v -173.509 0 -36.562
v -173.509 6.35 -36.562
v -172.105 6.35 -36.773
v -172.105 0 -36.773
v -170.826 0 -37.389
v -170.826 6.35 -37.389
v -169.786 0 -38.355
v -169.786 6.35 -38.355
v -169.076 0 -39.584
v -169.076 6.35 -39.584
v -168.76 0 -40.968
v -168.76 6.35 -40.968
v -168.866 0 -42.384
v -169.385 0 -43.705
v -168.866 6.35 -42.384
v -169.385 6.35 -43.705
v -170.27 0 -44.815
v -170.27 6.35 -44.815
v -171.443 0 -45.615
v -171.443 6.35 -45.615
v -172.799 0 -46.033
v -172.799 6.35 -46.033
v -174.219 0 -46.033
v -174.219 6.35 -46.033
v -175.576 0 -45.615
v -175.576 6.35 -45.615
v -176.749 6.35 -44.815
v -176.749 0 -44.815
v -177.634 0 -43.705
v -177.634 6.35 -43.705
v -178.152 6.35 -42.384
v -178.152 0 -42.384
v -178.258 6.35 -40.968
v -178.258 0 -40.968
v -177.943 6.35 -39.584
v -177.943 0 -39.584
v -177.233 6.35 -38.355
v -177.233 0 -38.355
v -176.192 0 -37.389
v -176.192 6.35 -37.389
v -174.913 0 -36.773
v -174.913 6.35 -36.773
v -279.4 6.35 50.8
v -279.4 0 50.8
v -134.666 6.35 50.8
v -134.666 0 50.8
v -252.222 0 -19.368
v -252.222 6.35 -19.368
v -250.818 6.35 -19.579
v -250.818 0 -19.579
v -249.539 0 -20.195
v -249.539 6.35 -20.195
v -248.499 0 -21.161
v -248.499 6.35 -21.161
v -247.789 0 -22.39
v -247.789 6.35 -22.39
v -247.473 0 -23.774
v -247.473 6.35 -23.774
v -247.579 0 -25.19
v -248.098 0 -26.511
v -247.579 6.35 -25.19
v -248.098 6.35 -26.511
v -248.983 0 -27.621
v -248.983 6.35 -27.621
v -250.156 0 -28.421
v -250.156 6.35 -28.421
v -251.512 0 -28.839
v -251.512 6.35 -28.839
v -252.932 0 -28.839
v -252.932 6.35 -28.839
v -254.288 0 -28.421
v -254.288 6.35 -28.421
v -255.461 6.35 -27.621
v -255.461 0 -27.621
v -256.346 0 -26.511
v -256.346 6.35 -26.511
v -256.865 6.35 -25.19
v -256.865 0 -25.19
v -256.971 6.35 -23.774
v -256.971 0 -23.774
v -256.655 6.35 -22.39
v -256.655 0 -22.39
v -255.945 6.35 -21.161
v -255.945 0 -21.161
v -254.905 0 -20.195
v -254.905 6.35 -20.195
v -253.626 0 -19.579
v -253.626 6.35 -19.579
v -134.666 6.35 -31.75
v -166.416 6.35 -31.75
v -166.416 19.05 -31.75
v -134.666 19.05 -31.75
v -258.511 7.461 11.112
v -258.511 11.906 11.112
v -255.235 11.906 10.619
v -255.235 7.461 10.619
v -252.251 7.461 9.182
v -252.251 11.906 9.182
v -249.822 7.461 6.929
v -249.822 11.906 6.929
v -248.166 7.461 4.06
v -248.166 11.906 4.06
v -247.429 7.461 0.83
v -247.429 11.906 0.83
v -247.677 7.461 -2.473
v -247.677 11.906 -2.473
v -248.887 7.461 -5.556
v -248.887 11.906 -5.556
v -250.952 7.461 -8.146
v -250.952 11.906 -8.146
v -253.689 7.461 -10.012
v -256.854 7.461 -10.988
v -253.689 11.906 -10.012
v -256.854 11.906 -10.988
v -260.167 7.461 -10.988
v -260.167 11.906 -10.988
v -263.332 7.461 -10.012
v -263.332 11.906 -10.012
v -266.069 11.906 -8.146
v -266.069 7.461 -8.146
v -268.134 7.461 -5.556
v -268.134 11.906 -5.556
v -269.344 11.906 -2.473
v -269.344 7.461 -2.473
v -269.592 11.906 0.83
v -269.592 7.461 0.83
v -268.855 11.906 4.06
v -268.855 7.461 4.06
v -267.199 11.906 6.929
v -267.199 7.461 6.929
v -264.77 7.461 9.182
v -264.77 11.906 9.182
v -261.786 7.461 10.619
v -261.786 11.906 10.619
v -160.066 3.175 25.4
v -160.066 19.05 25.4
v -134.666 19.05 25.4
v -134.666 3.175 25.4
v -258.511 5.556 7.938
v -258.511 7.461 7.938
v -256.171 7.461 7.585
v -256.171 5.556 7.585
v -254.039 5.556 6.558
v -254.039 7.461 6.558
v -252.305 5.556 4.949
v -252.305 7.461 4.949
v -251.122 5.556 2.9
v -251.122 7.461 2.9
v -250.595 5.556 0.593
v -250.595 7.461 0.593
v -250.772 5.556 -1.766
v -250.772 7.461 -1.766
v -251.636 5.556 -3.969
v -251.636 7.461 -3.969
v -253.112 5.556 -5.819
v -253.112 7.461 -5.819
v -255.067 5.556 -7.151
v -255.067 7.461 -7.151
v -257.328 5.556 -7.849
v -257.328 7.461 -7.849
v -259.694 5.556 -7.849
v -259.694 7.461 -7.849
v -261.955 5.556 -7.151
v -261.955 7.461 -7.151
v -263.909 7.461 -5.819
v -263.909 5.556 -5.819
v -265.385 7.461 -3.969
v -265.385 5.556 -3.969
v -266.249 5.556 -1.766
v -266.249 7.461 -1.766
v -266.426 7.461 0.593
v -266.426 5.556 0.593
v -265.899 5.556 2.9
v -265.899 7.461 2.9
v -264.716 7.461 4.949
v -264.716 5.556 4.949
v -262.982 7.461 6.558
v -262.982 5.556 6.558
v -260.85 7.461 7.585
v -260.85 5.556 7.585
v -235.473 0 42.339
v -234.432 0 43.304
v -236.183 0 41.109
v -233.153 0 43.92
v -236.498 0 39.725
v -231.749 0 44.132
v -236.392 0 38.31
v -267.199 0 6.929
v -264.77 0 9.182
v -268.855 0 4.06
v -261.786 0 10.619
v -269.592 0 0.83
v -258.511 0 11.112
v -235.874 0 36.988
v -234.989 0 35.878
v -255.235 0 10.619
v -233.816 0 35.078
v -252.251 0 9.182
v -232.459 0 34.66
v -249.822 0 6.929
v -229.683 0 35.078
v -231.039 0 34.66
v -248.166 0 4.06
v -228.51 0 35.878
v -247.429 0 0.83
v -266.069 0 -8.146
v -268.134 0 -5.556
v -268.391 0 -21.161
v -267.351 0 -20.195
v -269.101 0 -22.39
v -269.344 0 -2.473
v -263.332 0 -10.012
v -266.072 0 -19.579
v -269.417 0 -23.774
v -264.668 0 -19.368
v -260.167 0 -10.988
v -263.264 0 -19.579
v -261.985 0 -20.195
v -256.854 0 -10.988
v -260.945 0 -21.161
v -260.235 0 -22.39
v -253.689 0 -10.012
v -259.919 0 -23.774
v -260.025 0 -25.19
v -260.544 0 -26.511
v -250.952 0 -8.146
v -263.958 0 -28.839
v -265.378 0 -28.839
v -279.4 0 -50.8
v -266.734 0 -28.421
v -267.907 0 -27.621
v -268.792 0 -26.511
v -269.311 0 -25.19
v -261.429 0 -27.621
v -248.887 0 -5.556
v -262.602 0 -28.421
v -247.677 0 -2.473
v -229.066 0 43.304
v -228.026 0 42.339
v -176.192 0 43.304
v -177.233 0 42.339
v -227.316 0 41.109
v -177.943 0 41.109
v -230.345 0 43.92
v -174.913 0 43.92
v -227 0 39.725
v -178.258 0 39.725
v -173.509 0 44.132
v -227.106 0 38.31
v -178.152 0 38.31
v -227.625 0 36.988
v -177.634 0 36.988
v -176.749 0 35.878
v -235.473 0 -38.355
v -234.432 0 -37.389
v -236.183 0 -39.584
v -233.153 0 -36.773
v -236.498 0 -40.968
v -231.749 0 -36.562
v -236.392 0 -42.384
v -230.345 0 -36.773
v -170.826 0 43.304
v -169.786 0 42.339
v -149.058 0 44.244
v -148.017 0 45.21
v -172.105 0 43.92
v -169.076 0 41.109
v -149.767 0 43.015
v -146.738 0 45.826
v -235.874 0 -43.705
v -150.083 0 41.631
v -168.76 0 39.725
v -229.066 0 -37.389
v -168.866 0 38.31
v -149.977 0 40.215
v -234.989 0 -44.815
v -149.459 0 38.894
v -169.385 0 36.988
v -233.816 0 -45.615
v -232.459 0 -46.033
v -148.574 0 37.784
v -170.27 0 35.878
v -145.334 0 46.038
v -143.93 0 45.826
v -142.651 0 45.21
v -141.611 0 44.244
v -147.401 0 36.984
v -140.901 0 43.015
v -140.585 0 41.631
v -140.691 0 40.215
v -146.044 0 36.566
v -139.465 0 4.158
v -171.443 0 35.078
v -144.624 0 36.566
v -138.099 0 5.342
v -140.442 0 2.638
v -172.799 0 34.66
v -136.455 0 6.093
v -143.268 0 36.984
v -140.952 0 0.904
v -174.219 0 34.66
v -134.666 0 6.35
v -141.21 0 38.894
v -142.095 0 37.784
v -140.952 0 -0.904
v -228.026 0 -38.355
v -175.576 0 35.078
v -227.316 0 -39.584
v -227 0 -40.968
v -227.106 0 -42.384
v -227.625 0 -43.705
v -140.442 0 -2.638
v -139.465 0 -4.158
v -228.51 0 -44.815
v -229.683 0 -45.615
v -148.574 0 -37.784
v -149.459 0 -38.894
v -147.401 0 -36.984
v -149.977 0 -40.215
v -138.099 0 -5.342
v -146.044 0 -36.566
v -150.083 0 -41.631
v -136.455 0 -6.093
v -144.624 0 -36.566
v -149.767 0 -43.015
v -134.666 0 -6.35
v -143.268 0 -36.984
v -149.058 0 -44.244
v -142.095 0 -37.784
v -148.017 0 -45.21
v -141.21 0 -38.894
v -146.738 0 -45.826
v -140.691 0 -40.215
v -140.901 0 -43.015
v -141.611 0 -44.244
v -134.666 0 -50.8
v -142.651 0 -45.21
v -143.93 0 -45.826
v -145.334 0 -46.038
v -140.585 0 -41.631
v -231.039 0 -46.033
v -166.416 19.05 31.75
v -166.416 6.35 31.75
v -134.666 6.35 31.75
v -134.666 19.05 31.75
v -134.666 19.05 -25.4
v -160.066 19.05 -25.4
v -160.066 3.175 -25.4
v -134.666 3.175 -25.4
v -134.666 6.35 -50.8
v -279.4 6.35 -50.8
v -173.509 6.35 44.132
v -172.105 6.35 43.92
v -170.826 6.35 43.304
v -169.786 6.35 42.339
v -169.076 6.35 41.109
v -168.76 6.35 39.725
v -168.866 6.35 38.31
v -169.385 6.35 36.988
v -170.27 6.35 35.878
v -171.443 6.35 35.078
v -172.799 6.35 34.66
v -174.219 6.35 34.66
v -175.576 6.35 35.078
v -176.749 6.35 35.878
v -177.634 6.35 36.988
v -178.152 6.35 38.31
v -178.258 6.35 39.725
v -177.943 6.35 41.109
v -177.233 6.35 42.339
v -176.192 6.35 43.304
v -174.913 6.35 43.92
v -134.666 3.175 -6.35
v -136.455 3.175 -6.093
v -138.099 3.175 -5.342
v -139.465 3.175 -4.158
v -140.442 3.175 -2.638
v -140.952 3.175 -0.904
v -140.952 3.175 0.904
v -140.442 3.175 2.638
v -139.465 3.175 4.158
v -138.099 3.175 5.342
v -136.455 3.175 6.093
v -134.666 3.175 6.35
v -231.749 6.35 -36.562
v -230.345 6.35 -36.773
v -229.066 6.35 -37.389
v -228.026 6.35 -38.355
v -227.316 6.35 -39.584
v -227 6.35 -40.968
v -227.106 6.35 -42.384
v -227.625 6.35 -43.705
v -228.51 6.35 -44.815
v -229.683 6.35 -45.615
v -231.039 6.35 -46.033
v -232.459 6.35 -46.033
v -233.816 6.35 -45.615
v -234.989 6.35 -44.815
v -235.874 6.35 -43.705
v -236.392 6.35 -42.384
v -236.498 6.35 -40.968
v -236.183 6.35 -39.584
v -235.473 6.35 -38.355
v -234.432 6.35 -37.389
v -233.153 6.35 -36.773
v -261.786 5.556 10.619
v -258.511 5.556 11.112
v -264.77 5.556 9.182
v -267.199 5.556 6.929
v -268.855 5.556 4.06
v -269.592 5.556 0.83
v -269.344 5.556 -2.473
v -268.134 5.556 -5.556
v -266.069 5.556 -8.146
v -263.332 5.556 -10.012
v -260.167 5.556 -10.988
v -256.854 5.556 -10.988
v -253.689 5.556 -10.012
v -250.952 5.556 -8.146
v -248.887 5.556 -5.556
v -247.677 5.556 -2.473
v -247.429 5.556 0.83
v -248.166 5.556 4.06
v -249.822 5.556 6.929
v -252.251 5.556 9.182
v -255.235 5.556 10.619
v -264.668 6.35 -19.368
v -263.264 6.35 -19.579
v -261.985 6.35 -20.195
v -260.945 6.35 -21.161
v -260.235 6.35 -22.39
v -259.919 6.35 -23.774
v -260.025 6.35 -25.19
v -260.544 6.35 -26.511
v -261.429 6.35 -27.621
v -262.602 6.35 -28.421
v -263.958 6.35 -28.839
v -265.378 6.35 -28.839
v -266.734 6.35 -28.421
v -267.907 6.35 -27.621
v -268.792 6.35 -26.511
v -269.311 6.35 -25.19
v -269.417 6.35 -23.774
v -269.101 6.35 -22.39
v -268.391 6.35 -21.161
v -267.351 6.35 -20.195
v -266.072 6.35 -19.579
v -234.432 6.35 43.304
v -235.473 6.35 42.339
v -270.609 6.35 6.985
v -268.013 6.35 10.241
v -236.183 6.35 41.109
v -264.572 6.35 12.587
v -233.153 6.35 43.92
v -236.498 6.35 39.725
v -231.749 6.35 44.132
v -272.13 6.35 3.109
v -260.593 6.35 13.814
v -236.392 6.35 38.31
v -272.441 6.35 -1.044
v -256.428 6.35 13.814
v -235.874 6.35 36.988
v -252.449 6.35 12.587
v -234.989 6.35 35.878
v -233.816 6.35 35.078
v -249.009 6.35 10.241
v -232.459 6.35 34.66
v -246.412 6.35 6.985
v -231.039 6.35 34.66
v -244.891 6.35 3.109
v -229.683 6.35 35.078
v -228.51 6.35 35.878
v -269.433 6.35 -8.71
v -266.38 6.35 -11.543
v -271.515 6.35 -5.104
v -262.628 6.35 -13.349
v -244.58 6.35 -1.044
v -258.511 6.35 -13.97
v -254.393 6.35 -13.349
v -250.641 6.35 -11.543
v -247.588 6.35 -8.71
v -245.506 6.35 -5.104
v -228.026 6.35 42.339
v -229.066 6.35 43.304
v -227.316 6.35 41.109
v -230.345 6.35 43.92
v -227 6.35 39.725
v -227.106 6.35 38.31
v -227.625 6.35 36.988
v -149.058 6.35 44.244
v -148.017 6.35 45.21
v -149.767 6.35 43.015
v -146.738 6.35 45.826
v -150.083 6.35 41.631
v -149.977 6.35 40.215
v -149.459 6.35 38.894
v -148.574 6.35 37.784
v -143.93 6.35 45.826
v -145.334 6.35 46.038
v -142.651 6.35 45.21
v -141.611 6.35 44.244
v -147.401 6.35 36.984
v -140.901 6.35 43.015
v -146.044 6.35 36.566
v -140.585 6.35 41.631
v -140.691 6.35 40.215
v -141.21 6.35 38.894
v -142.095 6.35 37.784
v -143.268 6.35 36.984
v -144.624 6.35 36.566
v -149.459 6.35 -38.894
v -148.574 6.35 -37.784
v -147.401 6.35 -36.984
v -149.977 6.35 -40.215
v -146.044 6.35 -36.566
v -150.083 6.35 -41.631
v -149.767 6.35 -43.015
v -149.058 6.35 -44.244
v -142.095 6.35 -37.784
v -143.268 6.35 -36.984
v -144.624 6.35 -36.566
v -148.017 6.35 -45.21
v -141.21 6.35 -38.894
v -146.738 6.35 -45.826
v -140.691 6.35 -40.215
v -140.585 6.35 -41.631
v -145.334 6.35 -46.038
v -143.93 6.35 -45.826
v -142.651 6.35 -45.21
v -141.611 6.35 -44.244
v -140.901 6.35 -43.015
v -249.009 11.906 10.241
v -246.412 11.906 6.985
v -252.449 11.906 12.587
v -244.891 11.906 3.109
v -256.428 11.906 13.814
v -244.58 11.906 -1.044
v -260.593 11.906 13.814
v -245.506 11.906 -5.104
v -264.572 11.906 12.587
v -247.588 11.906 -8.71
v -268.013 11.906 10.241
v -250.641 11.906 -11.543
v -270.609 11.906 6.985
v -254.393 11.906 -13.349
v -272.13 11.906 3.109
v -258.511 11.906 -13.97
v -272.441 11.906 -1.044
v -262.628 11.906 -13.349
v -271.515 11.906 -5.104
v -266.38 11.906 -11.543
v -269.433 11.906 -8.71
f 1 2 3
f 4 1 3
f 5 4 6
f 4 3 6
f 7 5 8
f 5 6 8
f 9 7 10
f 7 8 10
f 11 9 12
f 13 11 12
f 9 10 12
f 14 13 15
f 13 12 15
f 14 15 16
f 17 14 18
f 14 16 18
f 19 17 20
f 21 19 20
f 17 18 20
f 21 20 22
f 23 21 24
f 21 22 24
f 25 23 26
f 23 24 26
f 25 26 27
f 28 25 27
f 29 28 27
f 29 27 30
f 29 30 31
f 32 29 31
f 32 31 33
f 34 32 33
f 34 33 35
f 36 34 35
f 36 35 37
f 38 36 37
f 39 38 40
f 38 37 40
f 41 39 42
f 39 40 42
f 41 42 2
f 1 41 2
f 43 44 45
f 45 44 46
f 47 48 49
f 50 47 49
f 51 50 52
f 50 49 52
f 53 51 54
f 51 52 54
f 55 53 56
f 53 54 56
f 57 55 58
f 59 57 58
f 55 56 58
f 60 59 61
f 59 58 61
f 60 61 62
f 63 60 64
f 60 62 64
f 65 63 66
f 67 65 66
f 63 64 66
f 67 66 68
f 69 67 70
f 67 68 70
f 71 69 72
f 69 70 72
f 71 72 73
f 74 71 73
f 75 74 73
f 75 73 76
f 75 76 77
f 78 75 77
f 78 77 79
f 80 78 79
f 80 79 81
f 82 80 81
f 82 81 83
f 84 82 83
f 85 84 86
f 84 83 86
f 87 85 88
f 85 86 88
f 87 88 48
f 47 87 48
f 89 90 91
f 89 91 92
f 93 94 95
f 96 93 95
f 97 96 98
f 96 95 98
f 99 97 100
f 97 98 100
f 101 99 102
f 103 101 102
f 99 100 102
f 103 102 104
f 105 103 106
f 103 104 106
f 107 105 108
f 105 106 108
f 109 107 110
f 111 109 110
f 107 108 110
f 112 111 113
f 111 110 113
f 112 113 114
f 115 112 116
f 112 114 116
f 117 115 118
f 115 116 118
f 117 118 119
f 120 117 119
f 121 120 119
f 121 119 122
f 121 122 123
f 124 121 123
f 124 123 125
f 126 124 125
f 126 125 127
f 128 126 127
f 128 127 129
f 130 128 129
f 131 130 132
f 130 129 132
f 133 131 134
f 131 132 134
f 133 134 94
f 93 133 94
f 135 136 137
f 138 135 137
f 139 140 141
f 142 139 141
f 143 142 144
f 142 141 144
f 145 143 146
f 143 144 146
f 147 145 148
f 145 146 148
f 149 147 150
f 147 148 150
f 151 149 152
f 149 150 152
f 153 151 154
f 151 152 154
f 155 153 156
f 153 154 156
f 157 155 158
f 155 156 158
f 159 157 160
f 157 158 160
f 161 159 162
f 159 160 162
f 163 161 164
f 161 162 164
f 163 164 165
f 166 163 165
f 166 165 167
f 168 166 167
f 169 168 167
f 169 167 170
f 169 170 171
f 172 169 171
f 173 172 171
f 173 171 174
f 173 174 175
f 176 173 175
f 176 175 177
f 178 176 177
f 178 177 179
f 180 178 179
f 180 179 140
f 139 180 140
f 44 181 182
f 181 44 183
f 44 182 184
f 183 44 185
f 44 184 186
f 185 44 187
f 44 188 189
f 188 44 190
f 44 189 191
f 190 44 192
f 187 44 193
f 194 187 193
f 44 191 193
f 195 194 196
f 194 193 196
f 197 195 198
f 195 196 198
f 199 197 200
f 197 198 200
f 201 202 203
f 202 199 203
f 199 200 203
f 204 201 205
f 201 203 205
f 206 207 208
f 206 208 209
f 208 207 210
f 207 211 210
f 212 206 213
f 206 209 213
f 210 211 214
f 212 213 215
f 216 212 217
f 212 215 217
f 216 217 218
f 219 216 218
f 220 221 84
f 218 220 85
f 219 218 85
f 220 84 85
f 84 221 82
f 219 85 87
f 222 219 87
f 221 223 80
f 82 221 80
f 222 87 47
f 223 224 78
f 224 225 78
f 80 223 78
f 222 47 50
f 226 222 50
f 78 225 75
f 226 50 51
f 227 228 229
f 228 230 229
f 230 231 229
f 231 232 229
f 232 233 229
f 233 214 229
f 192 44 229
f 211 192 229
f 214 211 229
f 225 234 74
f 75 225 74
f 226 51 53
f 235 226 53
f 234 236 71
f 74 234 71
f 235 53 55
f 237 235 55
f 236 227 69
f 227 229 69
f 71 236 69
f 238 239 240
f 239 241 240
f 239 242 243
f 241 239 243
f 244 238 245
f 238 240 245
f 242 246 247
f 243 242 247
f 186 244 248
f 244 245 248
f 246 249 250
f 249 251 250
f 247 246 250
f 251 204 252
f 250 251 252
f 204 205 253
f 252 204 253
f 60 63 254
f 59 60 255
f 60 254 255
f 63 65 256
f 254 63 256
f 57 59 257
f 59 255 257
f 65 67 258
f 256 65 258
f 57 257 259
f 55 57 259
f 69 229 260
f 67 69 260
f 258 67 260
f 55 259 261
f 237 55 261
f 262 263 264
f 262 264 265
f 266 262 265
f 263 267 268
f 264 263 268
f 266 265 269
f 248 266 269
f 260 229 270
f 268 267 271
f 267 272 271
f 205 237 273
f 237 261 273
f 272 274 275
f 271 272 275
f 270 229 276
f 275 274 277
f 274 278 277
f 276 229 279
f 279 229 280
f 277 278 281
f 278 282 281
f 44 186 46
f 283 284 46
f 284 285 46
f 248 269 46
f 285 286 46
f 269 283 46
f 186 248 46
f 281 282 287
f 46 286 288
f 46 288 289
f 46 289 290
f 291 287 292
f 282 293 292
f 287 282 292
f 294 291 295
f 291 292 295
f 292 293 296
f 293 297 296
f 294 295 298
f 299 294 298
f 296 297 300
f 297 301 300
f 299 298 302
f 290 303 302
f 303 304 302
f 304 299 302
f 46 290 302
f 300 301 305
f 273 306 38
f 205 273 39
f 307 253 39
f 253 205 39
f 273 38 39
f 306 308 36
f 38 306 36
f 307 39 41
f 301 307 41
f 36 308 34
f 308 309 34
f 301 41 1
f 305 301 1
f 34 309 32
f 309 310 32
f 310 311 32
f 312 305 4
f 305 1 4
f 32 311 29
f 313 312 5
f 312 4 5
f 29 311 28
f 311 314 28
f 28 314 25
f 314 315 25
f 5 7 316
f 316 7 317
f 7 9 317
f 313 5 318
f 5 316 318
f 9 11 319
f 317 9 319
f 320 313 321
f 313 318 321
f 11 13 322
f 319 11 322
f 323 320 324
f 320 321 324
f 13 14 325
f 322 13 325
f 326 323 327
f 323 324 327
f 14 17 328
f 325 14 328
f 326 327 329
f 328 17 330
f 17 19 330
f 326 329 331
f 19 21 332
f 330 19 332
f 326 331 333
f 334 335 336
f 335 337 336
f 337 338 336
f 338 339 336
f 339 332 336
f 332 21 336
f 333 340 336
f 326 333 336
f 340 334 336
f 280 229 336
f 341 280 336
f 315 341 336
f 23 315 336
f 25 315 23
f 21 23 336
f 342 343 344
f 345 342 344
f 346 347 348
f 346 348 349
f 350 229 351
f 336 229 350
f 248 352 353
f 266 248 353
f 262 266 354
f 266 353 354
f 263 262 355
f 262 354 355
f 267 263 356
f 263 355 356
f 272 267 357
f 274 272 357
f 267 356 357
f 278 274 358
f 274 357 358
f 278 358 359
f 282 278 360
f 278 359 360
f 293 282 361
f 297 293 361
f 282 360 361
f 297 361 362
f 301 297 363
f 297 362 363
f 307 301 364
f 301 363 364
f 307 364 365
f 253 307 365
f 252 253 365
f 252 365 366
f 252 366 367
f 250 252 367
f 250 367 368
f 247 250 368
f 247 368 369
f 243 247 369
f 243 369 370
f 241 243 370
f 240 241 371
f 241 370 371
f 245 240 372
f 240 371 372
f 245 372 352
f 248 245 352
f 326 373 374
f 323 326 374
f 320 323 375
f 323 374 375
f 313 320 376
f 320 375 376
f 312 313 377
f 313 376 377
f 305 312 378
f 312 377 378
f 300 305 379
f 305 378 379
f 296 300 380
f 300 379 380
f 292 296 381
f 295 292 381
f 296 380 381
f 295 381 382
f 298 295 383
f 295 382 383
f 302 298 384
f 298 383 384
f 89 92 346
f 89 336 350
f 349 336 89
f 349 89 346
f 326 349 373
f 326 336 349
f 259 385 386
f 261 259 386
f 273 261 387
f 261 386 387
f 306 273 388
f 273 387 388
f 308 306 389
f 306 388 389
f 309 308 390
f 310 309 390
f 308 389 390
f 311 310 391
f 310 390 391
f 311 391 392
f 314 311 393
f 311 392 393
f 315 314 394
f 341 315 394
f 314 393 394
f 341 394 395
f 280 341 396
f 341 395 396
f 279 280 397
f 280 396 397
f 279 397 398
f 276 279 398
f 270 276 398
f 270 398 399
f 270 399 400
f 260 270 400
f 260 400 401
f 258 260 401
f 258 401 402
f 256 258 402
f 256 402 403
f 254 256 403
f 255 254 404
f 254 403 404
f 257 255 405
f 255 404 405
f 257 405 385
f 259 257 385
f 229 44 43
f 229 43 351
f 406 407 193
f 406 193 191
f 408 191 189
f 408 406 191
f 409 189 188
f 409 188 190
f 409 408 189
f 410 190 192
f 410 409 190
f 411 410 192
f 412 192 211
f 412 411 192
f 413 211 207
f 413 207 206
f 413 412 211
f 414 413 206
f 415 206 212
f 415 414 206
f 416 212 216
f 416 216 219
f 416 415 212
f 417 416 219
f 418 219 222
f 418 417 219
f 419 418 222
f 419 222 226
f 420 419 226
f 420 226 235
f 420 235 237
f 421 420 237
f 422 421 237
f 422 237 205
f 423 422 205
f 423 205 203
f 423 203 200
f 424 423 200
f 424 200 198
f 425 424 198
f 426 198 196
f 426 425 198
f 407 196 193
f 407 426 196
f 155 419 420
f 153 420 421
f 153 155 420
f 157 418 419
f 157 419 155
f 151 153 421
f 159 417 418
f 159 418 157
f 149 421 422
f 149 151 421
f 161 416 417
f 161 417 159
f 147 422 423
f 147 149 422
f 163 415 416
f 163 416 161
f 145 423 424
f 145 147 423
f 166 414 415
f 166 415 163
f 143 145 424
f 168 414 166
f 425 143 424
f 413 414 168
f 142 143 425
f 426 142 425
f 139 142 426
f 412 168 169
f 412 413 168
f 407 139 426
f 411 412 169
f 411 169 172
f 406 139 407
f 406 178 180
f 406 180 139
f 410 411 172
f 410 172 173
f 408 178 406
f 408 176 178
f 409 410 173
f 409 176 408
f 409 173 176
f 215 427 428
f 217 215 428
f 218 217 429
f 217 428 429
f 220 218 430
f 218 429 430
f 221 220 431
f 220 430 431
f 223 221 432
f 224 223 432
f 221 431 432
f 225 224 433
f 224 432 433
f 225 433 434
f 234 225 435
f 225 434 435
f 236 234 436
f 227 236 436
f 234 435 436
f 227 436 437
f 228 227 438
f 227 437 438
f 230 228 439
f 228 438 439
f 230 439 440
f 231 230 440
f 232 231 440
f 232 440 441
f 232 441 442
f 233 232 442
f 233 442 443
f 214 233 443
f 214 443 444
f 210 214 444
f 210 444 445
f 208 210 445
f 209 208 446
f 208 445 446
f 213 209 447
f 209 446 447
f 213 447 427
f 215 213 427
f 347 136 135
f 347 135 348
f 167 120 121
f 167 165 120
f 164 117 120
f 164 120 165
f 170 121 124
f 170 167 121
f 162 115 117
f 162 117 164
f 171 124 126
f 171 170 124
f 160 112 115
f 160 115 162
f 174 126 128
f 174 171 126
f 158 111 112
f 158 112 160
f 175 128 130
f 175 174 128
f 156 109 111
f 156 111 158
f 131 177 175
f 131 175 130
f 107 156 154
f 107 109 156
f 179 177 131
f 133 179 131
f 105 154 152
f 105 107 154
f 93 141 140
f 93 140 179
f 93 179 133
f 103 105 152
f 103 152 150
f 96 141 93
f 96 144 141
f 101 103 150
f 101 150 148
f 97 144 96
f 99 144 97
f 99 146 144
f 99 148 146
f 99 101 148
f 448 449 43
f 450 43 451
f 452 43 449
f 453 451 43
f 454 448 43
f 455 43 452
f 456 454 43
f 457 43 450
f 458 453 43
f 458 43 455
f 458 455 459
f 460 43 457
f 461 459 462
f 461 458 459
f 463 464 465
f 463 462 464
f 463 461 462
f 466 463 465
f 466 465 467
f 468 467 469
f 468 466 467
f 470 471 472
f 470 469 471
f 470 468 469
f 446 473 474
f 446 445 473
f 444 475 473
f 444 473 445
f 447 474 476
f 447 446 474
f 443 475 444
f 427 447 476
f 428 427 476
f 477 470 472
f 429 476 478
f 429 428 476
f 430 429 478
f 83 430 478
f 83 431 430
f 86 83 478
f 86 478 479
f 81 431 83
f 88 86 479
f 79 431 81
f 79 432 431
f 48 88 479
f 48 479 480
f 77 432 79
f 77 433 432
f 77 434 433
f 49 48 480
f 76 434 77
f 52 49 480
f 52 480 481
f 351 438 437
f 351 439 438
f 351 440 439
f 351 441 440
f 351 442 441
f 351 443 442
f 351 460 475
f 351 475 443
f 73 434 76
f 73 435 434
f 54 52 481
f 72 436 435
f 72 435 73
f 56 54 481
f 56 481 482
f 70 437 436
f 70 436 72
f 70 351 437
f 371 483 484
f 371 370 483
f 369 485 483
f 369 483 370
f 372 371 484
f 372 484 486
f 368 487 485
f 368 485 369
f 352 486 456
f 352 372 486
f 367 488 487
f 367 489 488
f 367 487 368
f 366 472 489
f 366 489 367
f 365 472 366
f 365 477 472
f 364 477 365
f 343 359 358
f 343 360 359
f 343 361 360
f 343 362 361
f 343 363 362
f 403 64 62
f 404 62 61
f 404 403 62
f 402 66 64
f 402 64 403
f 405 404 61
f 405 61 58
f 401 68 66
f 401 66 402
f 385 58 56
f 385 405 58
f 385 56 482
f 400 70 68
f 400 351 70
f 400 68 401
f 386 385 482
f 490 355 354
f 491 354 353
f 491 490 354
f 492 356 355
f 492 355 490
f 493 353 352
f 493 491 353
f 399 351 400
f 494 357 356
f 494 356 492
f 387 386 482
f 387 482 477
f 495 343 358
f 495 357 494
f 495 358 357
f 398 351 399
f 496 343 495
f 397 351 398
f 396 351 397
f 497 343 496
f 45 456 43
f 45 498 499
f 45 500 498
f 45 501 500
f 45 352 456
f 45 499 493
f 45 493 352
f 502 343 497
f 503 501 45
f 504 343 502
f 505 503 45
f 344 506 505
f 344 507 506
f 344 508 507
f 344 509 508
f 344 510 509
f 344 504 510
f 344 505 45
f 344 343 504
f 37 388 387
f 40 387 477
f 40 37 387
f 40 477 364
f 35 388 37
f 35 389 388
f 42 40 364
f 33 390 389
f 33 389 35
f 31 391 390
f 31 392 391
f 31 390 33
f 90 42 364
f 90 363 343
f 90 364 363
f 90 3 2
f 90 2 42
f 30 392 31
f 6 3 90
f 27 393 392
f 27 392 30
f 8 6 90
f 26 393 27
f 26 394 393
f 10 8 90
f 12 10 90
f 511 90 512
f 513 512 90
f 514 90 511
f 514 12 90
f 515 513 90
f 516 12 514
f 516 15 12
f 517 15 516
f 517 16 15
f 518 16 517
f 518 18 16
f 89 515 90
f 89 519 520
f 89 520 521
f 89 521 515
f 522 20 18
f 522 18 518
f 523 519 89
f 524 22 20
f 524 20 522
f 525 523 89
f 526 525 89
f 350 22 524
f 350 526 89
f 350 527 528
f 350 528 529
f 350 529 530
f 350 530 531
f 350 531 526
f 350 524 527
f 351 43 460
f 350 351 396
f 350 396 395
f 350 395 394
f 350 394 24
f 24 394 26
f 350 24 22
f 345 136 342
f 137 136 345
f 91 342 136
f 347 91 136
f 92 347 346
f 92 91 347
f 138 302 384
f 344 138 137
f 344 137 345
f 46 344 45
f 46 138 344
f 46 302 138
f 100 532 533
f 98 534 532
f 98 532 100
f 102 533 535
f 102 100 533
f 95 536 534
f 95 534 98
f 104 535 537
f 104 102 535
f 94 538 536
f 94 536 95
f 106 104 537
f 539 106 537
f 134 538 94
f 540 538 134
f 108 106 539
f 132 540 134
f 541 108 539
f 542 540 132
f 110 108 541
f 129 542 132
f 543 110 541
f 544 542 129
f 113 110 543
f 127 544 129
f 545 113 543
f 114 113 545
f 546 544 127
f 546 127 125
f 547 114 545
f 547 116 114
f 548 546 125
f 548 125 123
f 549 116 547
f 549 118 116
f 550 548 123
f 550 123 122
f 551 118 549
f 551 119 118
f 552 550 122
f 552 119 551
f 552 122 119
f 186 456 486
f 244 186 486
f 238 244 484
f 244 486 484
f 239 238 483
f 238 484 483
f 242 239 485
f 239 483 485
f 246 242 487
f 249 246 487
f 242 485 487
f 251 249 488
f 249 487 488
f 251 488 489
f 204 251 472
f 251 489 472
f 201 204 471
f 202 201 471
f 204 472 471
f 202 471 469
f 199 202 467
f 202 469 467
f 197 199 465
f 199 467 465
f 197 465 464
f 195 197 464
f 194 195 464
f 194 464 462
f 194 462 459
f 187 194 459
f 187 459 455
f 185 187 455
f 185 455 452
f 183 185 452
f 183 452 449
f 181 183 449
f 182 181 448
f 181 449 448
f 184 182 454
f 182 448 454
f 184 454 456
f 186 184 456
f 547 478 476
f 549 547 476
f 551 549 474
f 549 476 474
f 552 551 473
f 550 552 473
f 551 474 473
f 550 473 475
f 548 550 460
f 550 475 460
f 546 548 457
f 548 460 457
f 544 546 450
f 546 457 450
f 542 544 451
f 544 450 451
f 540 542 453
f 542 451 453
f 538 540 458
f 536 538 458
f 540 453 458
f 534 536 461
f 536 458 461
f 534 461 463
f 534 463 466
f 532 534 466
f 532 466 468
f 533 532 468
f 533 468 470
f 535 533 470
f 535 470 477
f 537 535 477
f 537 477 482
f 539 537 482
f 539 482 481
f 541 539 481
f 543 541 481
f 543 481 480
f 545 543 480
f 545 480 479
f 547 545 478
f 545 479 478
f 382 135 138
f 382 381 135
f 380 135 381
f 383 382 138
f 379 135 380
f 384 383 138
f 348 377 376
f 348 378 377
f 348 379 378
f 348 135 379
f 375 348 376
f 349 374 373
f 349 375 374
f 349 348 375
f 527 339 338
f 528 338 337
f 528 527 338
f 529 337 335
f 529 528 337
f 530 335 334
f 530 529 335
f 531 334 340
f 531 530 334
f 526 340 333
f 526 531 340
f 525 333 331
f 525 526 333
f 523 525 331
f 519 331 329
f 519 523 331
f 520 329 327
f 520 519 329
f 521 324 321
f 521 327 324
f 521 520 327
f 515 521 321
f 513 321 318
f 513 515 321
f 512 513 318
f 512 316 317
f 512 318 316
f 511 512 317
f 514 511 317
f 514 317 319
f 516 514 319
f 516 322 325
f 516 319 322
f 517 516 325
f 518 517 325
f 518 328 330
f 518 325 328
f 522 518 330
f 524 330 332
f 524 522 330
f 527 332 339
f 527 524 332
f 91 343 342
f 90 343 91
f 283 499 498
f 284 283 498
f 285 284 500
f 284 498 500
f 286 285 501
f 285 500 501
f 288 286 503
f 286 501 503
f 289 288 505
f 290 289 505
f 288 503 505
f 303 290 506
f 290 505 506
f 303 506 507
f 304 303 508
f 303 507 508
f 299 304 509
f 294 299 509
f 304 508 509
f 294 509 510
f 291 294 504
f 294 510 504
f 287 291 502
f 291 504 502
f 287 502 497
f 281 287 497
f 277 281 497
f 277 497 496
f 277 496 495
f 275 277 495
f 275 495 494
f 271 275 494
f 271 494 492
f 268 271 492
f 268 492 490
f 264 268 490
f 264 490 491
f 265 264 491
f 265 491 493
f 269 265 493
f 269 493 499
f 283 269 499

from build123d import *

# Parameters (mm, degrees)
SKETCH1_W                = 279.4
SKETCH1_H                = 101.6
BOSS_EXTRUDE1_DEPTH      = 6.35
SKETCH2_R                = 13.97
BOSS_EXTRUDE3_DEPTH      = 5.55625
SKETCH9_R                = 11.1125
CUT_EXTRUDE4_DEPTH       = 4.445
CUT_EXTRUDE5_START       = -5.55625
SKETCH10_R               = 11.1125
CUT_EXTRUDE5_DEPTH       = 5.55625
SKETCH11_R               = 7.9375
CUT_EXTRUDE6_DEPTH       = 285.078633923
SKETCH12_R               = 6.35
CUT_EXTRUDE7_DEPTH       = 285.051619429
SKETCH22_W               = 63.5
SKETCH22_H               = 63.5
BOSS_EXTRUDE7_DEPTH      = 12.7
SKETCH25_W               = 50.8
SKETCH25_H               = 50.8
CUT_EXTRUDE11_DEPTH      = 15.875
SKETCH32_R               = 4.7625
CUT_EXTRUDE12_DEPTH      = 6.35
SKETCH38_W               = 46.99
SKETCH38_H               = 18.470251096
CUT_EXTRUDE13_DEPTH      = 6.35
SKETCH60_R               = 4.7625
CUT_EXTRUDE23_DEPTH      = 6.35
SKETCH64_R               = 4.7625
CUT_EXTRUDE24_DEPTH      = 285.264471927
SKETCH69_W               = 33.02
SKETCH69_H               = 6.35
BOSS_EXTRUDE10_DEPTH     = 19.05
SKETCH70_R               = 4.7625
SKETCH70_R_2             = 2.54
CUT_EXTRUDE26_DEPTH      = 6.35
SKETCH76_R               = 4.7625
CUT_EXTRUDE29_DEPTH      = 6.35
SKETCH77_W               = 46.99
SKETCH77_H               = 16.7871648
CUT_EXTRUDE30_DEPTH      = 6.35
SKETCH78_W               = 49.276
SKETCH78_H               = 66.342584104
CUT_EXTRUDE32_DEPTH      = 1.524
SKETCH79_R               = 4.7625
CUT_EXTRUDE33_DEPTH      = 4.826
CUT_EXTRUDE34_DEPTH      = 289.436124861
CUT_EXTRUDE34_DEPTH_BACK = 289.436124861


with BuildPart() as part:
    # Sketch1 → Boss-Extrude1 (new body)
    with BuildSketch(Plane(origin=(0, 0, 0), x_dir=(1, 0, 0), z_dir=(0, 1, 0))):
        with Locations((-139.7, 0)):
            Rectangle(SKETCH1_W, SKETCH1_H)
    extrude(amount=BOSS_EXTRUDE1_DEPTH)

    # Sketch2 → Boss-Extrude3 (add)
    with BuildSketch(Plane(origin=(0, 6.35, 0), x_dir=(1, 0, 0), z_dir=(0, 1, 0))):
        with Locations(Location((-258.510557857, 0, 0), (0, 0, 90))):
            Circle(SKETCH2_R)
    extrude(amount=BOSS_EXTRUDE3_DEPTH)

    # Sketch9 → Cut-Extrude4 (cut)
    with BuildSketch(Plane(origin=(0, 11.90625, 0), x_dir=(1, 0, 0), z_dir=(0, 1, 0))):
        with Locations(Location((-258.510557857, 0, 0), (0, 0, 270))):
            Circle(SKETCH9_R)
    extrude(amount=-CUT_EXTRUDE4_DEPTH, mode=Mode.SUBTRACT)

    # Sketch10 → Cut-Extrude5 (cut)
    with BuildSketch(Plane(origin=(0, 0, 0), x_dir=(-1, 0, 0), z_dir=(0, -1, 0)).offset(CUT_EXTRUDE5_START)):
        with Locations(Location((258.510557857, 0, 0), (0, 0, 270))):
            Circle(SKETCH10_R)
    extrude(amount=CUT_EXTRUDE5_DEPTH, mode=Mode.SUBTRACT)

    # Sketch11 → Cut-Extrude6 (cut, through all)
    with BuildSketch(Plane(origin=(0, 7.46125, 0), x_dir=(1, 0, 0), z_dir=(0, 1, 0))):
        with Locations(Location((-258.510557857, 0, 0), (0, 0, 270))):
            Circle(SKETCH11_R)
    extrude(amount=-CUT_EXTRUDE6_DEPTH, mode=Mode.SUBTRACT)

    # Sketch12 → Cut-Extrude7 (cut, through all)
    with BuildSketch(Plane(origin=(0, 6.35, 0), x_dir=(1, 0, 0), z_dir=(0, 1, 0))):
        with Locations(Location((-134.666203771, 0, 0), (0, 0, 270))):
            Circle(SKETCH12_R)
    extrude(amount=-CUT_EXTRUDE7_DEPTH, mode=Mode.SUBTRACT)

    # Sketch22 → Boss-Extrude7 (add)
    with BuildSketch(Plane(origin=(0, 6.35, 0), x_dir=(1, 0, 0), z_dir=(0, 1, 0))):
        with Locations((-134.666203771, 0)):
            Rectangle(SKETCH22_W, SKETCH22_H)
    extrude(amount=BOSS_EXTRUDE7_DEPTH)

    # Sketch25 → Cut-Extrude11 (cut)
    with BuildSketch(Plane(origin=(0, 19.05, 0), x_dir=(1, 0, 0), z_dir=(0, 1, 0))):
        with Locations((-134.666203771, 0)):
            Rectangle(SKETCH25_W, SKETCH25_H)
    extrude(amount=-CUT_EXTRUDE11_DEPTH, mode=Mode.SUBTRACT)

    # Sketch32 → Cut-Extrude12 (cut)
    with BuildSketch(Plane(origin=(0, 6.35, 0), x_dir=(1, 0, 0), z_dir=(0, 1, 0))):
        with Locations(Location((-67.44195898, -40.64, 0), (0, 0, 270))):
            Circle(SKETCH32_R)
        with Locations(Location((-81.41195898, -40.64, 0), (0, 0, 270))):
            Circle(SKETCH32_R)
        with Locations(Location((-67.44195898, 40.64, 0), (0, 0, 270))):
            Circle(SKETCH32_R)
        with Locations(Location((-81.41195898, 40.64, 0), (0, 0, 270))):
            Circle(SKETCH32_R)
    extrude(amount=-CUT_EXTRUDE12_DEPTH, mode=Mode.SUBTRACT)

    # Sketch38 → Cut-Extrude13 (cut)
    with BuildSketch(Plane(origin=(0, 6.35, 0), x_dir=(1, 0, 0), z_dir=(0, 1, 0))):
        with Locations((-23.495, -24.777709652)):
            Rectangle(SKETCH38_W, SKETCH38_H)
    extrude(amount=-CUT_EXTRUDE13_DEPTH, mode=Mode.SUBTRACT)

    # Sketch60 → Cut-Extrude23 (cut)
    with BuildSketch(Plane(origin=(0, 6.35, 0), x_dir=(1, 0, 0), z_dir=(0, 1, 0))):
        with Locations(Location((-231.7492444, 41.324145444, 0), (0, 0, 270))):
            Circle(SKETCH60_R)
        with Locations(Location((-231.7492444, -39.369341378, 0), (0, 0, 270))):
            Circle(SKETCH60_R)
        with Locations(Location((-173.509244294, -39.369341378, 0), (0, 0, 270))):
            Circle(SKETCH60_R)
        with Locations(Location((-173.509244294, 41.324145444, 0), (0, 0, 270))):
            Circle(SKETCH60_R)
    extrude(amount=-CUT_EXTRUDE23_DEPTH, mode=Mode.SUBTRACT)

    # Sketch64 → Cut-Extrude24 (cut, through all)
    with BuildSketch(Plane(origin=(0, 6.35, 0), x_dir=(1, 0, 0), z_dir=(0, 1, 0))):
        with Locations(Location((-145.334203771, -41.275, 0), (0, 0, 270))):
            Circle(SKETCH64_R)
        with Locations(Location((-123.998203771, -41.275, 0), (0, 0, 270))):
            Circle(SKETCH64_R)
    cut_extrude24 = extrude(amount=-CUT_EXTRUDE24_DEPTH, mode=Mode.SUBTRACT)

    # Mirror1: Cut-Extrude24 across plane
    add(cut_extrude24.mirror(Plane.XY), mode=Mode.SUBTRACT)

    # Sketch69 → Boss-Extrude10 (add)
    with BuildSketch(Plane.XY.offset(50.8)):
        with Locations((-70.465355554, 3.175)):
            Rectangle(SKETCH69_W, SKETCH69_H)
    boss_extrude10 = extrude(amount=BOSS_EXTRUDE10_DEPTH)

    # Sketch70 → Cut-Extrude26 (cut)
    with BuildSketch(Plane(origin=(0, 6.35, 0), x_dir=(1, 0, 0), z_dir=(0, 1, 0))):
        with Locations(Location((-76.815355554, -60.325, 0), (0, 0, 270))):
            Circle(SKETCH70_R)
        with Locations(Location((-64.115355554, -60.325, 0), (0, 0, 270))):
            Circle(SKETCH70_R_2)
    cut_extrude26 = extrude(amount=-CUT_EXTRUDE26_DEPTH, mode=Mode.SUBTRACT)

    # Mirror2: Boss-Extrude10, Cut-Extrude26 across plane
    add(boss_extrude10.mirror(Plane.XY))
    add(cut_extrude26.mirror(Plane.XY), mode=Mode.SUBTRACT)

    # Sketch76 → Cut-Extrude29 (cut)
    with BuildSketch(Plane(origin=(0, 6.35, 0), x_dir=(1, 0, 0), z_dir=(0, 1, 0))):
        with Locations(Location((-264.668, 24.13, 0), (0, 0, 270))):
            Circle(SKETCH76_R)
        with Locations(Location((-252.222, 24.13, 0), (0, 0, 270))):
            Circle(SKETCH76_R)
    extrude(amount=-CUT_EXTRUDE29_DEPTH, mode=Mode.SUBTRACT)

    # Sketch77 → Cut-Extrude30 (cut)
    with BuildSketch(Plane(origin=(0, 6.35, 0), x_dir=(1, 0, 0), z_dir=(0, 1, 0))):
        with Locations((-23.495, -42.4064176)):
            Rectangle(SKETCH77_W, SKETCH77_H)
    extrude(amount=-CUT_EXTRUDE30_DEPTH, mode=Mode.SUBTRACT)

    # Sketch78 → Cut-Extrude32 (cut)
    with BuildSketch(Plane(origin=(0, 6.35, 0), x_dir=(1, 0, 0), z_dir=(0, 1, 0))):
        with Locations((-24.638, 17.628707948)):
            Rectangle(SKETCH78_W, SKETCH78_H)
    extrude(amount=-CUT_EXTRUDE32_DEPTH, mode=Mode.SUBTRACT)

    # Sketch79 → Cut-Extrude33 (cut)
    with BuildSketch(Plane(origin=(0, 4.826, 0), x_dir=(1, 0, 0), z_dir=(0, 1, 0))):
        with Locations(Location((-23.876, 15.191415896, 0), (0, 0, 270))):
            Circle(SKETCH79_R)
    extrude(amount=-CUT_EXTRUDE33_DEPTH, mode=Mode.SUBTRACT)

    # Sketch80 → Cut-Extrude34 (cut, two sides: drawn at the far end of the back side and taken through both)
    with BuildSketch(Plane(origin=(0, 3.175, 0), x_dir=(1, 0, 0), z_dir=(0, 1, 0)).offset(-CUT_EXTRUDE34_DEPTH_BACK)):
        Polygon((-134.666203771, 437.651664562), (-134.666203771, 50.8), (-134.666203771, 0), (-134.666203771, -50.8), (-134.666203771, -437.651664562), (639.037125352, -437.651664562), (639.037125352, 437.651664562), align=None)
    extrude(amount=CUT_EXTRUDE34_DEPTH + CUT_EXTRUDE34_DEPTH_BACK, mode=Mode.SUBTRACT)


solid = part.part
